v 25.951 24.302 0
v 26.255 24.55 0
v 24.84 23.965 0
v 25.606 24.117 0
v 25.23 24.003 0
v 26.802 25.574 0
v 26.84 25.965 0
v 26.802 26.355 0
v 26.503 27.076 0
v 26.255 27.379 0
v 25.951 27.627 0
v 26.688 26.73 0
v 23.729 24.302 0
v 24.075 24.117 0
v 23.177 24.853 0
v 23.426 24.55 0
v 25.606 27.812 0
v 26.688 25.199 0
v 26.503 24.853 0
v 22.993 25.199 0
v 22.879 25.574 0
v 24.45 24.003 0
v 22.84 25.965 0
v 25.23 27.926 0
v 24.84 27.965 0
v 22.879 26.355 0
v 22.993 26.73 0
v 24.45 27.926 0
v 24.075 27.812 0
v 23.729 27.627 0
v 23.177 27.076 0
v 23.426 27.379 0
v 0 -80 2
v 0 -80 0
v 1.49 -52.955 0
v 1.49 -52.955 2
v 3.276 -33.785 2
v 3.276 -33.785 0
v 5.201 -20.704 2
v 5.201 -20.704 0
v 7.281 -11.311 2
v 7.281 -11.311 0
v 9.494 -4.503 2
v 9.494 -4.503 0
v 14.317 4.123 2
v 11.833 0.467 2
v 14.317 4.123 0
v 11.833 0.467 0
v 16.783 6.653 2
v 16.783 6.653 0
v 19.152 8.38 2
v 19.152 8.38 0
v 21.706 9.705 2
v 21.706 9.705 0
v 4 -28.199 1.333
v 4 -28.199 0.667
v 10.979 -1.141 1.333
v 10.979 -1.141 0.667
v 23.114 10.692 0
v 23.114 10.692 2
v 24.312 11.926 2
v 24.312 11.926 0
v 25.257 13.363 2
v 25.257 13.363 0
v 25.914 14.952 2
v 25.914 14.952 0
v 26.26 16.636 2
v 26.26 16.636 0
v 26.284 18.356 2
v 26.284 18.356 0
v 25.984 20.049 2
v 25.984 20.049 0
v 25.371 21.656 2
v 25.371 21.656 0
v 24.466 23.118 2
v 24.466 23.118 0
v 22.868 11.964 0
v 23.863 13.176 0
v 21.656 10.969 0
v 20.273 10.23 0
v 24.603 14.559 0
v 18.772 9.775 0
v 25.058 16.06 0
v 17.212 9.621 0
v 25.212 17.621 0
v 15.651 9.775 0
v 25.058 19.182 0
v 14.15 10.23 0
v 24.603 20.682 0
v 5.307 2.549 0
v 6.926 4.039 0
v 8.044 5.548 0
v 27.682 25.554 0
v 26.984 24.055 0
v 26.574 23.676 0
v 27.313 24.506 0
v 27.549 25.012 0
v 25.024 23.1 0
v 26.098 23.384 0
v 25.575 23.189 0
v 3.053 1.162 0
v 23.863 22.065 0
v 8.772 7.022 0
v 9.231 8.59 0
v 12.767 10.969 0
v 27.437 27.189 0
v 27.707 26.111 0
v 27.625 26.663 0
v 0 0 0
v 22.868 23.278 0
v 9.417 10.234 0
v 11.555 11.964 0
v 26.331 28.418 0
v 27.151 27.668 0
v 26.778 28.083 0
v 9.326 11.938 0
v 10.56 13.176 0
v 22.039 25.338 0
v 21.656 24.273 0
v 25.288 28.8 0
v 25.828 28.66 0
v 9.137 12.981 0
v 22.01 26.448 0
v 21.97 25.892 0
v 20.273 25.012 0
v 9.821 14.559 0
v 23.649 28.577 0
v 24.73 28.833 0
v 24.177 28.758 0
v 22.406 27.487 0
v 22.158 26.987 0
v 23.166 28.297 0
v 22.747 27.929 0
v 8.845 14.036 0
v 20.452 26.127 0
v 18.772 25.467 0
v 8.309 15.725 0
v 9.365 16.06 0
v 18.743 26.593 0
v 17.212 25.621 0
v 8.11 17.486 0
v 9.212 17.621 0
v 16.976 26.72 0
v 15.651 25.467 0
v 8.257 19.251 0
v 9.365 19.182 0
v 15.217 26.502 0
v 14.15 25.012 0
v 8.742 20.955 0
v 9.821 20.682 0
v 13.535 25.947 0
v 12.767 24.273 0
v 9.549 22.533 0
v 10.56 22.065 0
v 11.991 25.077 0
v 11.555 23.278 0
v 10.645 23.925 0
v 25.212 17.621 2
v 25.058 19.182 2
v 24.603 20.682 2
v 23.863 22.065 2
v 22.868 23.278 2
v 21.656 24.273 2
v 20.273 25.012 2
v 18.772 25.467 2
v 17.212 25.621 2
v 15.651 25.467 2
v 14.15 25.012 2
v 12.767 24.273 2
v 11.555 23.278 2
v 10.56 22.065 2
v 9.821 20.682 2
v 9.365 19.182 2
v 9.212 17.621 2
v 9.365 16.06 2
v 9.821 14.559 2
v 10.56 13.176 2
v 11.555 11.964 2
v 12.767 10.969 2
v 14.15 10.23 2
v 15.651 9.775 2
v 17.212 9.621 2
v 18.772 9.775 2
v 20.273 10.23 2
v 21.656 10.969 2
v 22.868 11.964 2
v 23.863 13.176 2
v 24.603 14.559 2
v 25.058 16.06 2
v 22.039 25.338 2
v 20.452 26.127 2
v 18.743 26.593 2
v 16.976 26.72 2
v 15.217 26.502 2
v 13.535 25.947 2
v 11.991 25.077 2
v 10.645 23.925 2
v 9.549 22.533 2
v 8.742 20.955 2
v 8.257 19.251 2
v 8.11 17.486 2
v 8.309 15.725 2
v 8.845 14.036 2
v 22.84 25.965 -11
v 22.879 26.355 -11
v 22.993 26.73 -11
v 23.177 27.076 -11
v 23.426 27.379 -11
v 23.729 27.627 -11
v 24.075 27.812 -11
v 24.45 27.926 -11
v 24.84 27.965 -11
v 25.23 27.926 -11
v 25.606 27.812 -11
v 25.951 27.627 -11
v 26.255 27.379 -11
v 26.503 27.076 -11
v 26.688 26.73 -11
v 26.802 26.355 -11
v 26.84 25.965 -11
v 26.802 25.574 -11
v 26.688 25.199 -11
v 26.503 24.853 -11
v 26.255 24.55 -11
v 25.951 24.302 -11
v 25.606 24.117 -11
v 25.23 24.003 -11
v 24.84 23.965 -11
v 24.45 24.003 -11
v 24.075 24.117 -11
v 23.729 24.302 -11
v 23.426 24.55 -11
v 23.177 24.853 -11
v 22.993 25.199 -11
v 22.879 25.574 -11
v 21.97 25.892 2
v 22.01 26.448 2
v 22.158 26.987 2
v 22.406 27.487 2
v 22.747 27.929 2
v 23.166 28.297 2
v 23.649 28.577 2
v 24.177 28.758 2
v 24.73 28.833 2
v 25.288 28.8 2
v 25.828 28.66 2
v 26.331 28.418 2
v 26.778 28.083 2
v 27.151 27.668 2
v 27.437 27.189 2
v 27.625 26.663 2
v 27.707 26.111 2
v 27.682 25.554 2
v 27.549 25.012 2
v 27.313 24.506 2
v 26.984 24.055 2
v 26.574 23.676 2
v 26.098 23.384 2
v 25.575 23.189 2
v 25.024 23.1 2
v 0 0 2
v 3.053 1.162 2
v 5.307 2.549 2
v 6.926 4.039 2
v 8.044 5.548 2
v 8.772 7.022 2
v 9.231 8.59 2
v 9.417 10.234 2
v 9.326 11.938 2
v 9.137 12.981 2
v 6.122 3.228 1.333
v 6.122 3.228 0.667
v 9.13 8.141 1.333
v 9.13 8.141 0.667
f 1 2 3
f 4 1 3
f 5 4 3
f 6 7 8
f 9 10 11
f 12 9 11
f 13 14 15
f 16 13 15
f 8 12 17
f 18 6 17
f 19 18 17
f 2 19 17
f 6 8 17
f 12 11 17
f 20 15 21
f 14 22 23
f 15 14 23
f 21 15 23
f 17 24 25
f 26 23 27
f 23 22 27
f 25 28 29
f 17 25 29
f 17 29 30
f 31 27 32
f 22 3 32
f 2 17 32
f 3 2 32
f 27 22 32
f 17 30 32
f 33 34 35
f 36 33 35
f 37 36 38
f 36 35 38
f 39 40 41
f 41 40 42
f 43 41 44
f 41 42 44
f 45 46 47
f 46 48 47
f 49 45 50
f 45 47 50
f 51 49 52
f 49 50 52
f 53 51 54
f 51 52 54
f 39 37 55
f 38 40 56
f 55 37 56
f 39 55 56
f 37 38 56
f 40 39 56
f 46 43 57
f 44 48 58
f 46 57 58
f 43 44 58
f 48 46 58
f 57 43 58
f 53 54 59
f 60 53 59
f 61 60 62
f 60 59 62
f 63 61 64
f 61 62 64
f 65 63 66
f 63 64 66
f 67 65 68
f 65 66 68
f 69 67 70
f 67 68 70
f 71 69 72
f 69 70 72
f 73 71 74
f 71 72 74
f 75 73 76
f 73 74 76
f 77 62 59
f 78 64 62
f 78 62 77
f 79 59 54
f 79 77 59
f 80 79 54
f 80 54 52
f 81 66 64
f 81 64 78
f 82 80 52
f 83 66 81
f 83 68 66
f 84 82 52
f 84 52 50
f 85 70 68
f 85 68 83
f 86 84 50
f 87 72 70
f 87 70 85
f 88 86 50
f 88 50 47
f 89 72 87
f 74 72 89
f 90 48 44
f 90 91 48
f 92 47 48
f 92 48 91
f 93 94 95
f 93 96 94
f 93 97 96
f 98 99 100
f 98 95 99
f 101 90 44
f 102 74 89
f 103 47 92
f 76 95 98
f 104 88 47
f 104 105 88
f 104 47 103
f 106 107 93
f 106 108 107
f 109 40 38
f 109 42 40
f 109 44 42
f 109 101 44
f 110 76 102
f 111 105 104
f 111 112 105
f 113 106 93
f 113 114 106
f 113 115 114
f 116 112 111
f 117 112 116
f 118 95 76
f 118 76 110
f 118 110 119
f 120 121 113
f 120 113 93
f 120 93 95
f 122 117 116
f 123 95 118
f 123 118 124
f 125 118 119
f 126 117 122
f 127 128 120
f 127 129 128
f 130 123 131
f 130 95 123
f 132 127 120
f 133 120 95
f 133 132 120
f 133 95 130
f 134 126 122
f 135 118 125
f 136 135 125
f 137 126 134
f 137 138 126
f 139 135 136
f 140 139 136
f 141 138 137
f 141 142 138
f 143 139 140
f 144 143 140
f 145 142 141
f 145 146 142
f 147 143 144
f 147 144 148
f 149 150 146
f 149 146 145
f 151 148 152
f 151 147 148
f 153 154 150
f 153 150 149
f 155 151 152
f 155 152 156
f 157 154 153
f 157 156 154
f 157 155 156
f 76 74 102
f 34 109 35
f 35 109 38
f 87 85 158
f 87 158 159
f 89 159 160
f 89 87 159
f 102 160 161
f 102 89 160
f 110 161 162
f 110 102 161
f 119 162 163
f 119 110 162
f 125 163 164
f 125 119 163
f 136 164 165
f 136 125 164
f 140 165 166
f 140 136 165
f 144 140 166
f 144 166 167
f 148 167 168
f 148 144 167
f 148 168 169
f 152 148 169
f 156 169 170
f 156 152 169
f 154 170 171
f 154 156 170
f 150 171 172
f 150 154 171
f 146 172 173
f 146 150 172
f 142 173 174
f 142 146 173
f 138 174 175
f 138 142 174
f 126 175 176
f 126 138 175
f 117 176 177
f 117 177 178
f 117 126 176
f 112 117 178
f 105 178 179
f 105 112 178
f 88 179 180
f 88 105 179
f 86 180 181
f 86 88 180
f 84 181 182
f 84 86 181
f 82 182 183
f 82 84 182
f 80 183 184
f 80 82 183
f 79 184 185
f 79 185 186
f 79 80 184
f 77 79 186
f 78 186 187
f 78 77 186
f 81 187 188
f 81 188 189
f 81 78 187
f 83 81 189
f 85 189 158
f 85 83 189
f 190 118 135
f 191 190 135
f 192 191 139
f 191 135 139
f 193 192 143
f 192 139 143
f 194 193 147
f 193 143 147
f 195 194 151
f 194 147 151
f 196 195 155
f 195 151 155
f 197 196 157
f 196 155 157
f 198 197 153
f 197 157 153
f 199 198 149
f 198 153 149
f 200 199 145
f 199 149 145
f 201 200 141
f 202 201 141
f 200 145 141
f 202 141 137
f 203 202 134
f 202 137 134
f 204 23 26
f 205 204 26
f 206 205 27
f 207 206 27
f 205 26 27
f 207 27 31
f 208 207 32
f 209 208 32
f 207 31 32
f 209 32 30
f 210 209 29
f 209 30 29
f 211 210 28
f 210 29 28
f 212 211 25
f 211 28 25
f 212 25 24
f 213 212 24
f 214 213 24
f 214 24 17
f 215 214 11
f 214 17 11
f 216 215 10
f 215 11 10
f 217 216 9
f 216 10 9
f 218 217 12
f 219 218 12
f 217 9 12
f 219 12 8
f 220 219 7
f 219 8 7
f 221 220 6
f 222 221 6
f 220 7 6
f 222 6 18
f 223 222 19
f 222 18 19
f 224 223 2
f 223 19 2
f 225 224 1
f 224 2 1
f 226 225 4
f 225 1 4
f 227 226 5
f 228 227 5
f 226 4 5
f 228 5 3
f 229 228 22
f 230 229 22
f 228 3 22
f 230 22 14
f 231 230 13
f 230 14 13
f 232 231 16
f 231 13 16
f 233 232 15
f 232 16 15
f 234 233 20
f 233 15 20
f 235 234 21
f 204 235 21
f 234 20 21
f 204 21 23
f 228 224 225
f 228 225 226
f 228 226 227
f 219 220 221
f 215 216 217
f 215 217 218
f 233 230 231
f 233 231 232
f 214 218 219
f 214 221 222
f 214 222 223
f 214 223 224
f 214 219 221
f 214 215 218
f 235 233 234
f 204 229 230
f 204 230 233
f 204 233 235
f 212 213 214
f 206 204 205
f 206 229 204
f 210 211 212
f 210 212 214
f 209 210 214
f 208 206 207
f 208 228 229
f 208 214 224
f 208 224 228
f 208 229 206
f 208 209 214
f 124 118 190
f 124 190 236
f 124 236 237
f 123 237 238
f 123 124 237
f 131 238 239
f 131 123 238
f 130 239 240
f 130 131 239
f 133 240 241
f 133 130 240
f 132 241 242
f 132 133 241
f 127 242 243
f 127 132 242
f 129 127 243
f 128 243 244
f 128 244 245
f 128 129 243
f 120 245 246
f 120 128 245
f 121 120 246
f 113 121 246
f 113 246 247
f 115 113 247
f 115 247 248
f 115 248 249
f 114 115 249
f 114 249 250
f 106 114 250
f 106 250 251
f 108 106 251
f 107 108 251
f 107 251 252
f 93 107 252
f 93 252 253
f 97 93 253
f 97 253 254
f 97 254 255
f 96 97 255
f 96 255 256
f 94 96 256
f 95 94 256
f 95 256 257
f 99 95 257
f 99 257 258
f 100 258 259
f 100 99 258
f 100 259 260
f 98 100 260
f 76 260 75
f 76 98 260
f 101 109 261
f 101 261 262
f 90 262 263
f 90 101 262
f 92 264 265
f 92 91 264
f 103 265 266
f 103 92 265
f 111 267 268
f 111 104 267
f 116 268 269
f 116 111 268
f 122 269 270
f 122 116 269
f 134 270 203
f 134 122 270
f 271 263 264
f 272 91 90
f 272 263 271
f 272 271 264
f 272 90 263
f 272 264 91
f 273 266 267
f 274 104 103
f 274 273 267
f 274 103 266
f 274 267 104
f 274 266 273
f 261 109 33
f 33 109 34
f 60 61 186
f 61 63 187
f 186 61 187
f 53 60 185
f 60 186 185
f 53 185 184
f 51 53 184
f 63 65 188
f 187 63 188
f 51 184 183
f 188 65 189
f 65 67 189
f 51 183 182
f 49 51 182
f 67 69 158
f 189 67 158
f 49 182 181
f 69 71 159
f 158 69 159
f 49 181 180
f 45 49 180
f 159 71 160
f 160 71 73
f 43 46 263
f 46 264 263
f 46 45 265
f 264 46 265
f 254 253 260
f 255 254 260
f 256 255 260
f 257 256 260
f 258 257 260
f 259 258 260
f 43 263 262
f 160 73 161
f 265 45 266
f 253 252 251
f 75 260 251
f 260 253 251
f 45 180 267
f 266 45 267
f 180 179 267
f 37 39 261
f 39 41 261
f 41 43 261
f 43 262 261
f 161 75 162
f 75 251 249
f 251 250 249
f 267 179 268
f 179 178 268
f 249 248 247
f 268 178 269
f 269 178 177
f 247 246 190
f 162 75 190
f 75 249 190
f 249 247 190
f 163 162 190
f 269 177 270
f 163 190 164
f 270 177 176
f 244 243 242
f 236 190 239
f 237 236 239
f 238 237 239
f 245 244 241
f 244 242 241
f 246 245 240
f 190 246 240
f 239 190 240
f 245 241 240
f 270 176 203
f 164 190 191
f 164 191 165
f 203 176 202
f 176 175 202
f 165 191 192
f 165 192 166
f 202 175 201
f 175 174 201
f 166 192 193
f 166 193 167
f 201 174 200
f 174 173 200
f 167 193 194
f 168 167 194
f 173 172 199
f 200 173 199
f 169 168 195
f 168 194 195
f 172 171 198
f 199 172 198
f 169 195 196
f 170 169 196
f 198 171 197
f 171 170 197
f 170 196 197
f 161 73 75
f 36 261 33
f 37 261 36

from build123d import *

# Parameters (mm, degrees)
SKETCH_1_R      = 8
EXTRUDE_1_DEPTH = 2
SKETCH_4_R      = 2
EXTRUDE_3_DEPTH = 11
SKETCH_5_R      = 2.870898962
EXTRUDE_4_DEPTH = 2


with BuildPart() as part:
    # 草图1 → 凸台-拉伸1 (new body)
    with BuildSketch(Plane.XY):
        with BuildLine():
            add(Edge.make_bspline(
                [(0, 0), (7.619140502, 2.152110585), (10.835651992, 7.883222637), (8.845016995, 14.036127647)],
                knots=[0, 0, 0, 0, 1, 1, 1, 1], degree=3))
            Line((0, 0), (0, -80))
            add(Edge.make_bspline(
                [(0, -80), (2.767736812, -12.982453188), (8.848199723, 4.119657414), (21.705777592, 9.705463364)],
                knots=[0, 0, 0, 0, 1, 1, 1, 1], degree=3))
            ThreePointArc((21.705777592, 9.705463364), (20.116416659, 26.247156045), (8.845016995, 14.036127647))
        make_face()
        with Locations((17.211642927, 17.620858295)):
            Circle(SKETCH_1_R, mode=Mode.SUBTRACT)
    extrude(amount=EXTRUDE_1_DEPTH)

    # 草图5 → 凸台-拉伸4 (add)
    with BuildSketch(Plane(origin=(0, 0, 0), x_dir=(-1, 0, 0), z_dir=(0, 0, -1))):
        with Locations((-24.840299444, 25.964534935)):
            Circle(SKETCH_5_R)
    extrude(amount=-EXTRUDE_4_DEPTH)


with BuildPart() as body_2:
    # 草图4 → 凸台-拉伸3 (new body)
    with BuildSketch(Plane(origin=(0, 0, 0), x_dir=(-1, 0, 0), z_dir=(0, 0, -1))):
        with Locations((-24.84029944, 25.96453493)):
            Circle(SKETCH_4_R)
    extrude(amount=EXTRUDE_3_DEPTH)


solid = Compound([part.part, body_2.part])
